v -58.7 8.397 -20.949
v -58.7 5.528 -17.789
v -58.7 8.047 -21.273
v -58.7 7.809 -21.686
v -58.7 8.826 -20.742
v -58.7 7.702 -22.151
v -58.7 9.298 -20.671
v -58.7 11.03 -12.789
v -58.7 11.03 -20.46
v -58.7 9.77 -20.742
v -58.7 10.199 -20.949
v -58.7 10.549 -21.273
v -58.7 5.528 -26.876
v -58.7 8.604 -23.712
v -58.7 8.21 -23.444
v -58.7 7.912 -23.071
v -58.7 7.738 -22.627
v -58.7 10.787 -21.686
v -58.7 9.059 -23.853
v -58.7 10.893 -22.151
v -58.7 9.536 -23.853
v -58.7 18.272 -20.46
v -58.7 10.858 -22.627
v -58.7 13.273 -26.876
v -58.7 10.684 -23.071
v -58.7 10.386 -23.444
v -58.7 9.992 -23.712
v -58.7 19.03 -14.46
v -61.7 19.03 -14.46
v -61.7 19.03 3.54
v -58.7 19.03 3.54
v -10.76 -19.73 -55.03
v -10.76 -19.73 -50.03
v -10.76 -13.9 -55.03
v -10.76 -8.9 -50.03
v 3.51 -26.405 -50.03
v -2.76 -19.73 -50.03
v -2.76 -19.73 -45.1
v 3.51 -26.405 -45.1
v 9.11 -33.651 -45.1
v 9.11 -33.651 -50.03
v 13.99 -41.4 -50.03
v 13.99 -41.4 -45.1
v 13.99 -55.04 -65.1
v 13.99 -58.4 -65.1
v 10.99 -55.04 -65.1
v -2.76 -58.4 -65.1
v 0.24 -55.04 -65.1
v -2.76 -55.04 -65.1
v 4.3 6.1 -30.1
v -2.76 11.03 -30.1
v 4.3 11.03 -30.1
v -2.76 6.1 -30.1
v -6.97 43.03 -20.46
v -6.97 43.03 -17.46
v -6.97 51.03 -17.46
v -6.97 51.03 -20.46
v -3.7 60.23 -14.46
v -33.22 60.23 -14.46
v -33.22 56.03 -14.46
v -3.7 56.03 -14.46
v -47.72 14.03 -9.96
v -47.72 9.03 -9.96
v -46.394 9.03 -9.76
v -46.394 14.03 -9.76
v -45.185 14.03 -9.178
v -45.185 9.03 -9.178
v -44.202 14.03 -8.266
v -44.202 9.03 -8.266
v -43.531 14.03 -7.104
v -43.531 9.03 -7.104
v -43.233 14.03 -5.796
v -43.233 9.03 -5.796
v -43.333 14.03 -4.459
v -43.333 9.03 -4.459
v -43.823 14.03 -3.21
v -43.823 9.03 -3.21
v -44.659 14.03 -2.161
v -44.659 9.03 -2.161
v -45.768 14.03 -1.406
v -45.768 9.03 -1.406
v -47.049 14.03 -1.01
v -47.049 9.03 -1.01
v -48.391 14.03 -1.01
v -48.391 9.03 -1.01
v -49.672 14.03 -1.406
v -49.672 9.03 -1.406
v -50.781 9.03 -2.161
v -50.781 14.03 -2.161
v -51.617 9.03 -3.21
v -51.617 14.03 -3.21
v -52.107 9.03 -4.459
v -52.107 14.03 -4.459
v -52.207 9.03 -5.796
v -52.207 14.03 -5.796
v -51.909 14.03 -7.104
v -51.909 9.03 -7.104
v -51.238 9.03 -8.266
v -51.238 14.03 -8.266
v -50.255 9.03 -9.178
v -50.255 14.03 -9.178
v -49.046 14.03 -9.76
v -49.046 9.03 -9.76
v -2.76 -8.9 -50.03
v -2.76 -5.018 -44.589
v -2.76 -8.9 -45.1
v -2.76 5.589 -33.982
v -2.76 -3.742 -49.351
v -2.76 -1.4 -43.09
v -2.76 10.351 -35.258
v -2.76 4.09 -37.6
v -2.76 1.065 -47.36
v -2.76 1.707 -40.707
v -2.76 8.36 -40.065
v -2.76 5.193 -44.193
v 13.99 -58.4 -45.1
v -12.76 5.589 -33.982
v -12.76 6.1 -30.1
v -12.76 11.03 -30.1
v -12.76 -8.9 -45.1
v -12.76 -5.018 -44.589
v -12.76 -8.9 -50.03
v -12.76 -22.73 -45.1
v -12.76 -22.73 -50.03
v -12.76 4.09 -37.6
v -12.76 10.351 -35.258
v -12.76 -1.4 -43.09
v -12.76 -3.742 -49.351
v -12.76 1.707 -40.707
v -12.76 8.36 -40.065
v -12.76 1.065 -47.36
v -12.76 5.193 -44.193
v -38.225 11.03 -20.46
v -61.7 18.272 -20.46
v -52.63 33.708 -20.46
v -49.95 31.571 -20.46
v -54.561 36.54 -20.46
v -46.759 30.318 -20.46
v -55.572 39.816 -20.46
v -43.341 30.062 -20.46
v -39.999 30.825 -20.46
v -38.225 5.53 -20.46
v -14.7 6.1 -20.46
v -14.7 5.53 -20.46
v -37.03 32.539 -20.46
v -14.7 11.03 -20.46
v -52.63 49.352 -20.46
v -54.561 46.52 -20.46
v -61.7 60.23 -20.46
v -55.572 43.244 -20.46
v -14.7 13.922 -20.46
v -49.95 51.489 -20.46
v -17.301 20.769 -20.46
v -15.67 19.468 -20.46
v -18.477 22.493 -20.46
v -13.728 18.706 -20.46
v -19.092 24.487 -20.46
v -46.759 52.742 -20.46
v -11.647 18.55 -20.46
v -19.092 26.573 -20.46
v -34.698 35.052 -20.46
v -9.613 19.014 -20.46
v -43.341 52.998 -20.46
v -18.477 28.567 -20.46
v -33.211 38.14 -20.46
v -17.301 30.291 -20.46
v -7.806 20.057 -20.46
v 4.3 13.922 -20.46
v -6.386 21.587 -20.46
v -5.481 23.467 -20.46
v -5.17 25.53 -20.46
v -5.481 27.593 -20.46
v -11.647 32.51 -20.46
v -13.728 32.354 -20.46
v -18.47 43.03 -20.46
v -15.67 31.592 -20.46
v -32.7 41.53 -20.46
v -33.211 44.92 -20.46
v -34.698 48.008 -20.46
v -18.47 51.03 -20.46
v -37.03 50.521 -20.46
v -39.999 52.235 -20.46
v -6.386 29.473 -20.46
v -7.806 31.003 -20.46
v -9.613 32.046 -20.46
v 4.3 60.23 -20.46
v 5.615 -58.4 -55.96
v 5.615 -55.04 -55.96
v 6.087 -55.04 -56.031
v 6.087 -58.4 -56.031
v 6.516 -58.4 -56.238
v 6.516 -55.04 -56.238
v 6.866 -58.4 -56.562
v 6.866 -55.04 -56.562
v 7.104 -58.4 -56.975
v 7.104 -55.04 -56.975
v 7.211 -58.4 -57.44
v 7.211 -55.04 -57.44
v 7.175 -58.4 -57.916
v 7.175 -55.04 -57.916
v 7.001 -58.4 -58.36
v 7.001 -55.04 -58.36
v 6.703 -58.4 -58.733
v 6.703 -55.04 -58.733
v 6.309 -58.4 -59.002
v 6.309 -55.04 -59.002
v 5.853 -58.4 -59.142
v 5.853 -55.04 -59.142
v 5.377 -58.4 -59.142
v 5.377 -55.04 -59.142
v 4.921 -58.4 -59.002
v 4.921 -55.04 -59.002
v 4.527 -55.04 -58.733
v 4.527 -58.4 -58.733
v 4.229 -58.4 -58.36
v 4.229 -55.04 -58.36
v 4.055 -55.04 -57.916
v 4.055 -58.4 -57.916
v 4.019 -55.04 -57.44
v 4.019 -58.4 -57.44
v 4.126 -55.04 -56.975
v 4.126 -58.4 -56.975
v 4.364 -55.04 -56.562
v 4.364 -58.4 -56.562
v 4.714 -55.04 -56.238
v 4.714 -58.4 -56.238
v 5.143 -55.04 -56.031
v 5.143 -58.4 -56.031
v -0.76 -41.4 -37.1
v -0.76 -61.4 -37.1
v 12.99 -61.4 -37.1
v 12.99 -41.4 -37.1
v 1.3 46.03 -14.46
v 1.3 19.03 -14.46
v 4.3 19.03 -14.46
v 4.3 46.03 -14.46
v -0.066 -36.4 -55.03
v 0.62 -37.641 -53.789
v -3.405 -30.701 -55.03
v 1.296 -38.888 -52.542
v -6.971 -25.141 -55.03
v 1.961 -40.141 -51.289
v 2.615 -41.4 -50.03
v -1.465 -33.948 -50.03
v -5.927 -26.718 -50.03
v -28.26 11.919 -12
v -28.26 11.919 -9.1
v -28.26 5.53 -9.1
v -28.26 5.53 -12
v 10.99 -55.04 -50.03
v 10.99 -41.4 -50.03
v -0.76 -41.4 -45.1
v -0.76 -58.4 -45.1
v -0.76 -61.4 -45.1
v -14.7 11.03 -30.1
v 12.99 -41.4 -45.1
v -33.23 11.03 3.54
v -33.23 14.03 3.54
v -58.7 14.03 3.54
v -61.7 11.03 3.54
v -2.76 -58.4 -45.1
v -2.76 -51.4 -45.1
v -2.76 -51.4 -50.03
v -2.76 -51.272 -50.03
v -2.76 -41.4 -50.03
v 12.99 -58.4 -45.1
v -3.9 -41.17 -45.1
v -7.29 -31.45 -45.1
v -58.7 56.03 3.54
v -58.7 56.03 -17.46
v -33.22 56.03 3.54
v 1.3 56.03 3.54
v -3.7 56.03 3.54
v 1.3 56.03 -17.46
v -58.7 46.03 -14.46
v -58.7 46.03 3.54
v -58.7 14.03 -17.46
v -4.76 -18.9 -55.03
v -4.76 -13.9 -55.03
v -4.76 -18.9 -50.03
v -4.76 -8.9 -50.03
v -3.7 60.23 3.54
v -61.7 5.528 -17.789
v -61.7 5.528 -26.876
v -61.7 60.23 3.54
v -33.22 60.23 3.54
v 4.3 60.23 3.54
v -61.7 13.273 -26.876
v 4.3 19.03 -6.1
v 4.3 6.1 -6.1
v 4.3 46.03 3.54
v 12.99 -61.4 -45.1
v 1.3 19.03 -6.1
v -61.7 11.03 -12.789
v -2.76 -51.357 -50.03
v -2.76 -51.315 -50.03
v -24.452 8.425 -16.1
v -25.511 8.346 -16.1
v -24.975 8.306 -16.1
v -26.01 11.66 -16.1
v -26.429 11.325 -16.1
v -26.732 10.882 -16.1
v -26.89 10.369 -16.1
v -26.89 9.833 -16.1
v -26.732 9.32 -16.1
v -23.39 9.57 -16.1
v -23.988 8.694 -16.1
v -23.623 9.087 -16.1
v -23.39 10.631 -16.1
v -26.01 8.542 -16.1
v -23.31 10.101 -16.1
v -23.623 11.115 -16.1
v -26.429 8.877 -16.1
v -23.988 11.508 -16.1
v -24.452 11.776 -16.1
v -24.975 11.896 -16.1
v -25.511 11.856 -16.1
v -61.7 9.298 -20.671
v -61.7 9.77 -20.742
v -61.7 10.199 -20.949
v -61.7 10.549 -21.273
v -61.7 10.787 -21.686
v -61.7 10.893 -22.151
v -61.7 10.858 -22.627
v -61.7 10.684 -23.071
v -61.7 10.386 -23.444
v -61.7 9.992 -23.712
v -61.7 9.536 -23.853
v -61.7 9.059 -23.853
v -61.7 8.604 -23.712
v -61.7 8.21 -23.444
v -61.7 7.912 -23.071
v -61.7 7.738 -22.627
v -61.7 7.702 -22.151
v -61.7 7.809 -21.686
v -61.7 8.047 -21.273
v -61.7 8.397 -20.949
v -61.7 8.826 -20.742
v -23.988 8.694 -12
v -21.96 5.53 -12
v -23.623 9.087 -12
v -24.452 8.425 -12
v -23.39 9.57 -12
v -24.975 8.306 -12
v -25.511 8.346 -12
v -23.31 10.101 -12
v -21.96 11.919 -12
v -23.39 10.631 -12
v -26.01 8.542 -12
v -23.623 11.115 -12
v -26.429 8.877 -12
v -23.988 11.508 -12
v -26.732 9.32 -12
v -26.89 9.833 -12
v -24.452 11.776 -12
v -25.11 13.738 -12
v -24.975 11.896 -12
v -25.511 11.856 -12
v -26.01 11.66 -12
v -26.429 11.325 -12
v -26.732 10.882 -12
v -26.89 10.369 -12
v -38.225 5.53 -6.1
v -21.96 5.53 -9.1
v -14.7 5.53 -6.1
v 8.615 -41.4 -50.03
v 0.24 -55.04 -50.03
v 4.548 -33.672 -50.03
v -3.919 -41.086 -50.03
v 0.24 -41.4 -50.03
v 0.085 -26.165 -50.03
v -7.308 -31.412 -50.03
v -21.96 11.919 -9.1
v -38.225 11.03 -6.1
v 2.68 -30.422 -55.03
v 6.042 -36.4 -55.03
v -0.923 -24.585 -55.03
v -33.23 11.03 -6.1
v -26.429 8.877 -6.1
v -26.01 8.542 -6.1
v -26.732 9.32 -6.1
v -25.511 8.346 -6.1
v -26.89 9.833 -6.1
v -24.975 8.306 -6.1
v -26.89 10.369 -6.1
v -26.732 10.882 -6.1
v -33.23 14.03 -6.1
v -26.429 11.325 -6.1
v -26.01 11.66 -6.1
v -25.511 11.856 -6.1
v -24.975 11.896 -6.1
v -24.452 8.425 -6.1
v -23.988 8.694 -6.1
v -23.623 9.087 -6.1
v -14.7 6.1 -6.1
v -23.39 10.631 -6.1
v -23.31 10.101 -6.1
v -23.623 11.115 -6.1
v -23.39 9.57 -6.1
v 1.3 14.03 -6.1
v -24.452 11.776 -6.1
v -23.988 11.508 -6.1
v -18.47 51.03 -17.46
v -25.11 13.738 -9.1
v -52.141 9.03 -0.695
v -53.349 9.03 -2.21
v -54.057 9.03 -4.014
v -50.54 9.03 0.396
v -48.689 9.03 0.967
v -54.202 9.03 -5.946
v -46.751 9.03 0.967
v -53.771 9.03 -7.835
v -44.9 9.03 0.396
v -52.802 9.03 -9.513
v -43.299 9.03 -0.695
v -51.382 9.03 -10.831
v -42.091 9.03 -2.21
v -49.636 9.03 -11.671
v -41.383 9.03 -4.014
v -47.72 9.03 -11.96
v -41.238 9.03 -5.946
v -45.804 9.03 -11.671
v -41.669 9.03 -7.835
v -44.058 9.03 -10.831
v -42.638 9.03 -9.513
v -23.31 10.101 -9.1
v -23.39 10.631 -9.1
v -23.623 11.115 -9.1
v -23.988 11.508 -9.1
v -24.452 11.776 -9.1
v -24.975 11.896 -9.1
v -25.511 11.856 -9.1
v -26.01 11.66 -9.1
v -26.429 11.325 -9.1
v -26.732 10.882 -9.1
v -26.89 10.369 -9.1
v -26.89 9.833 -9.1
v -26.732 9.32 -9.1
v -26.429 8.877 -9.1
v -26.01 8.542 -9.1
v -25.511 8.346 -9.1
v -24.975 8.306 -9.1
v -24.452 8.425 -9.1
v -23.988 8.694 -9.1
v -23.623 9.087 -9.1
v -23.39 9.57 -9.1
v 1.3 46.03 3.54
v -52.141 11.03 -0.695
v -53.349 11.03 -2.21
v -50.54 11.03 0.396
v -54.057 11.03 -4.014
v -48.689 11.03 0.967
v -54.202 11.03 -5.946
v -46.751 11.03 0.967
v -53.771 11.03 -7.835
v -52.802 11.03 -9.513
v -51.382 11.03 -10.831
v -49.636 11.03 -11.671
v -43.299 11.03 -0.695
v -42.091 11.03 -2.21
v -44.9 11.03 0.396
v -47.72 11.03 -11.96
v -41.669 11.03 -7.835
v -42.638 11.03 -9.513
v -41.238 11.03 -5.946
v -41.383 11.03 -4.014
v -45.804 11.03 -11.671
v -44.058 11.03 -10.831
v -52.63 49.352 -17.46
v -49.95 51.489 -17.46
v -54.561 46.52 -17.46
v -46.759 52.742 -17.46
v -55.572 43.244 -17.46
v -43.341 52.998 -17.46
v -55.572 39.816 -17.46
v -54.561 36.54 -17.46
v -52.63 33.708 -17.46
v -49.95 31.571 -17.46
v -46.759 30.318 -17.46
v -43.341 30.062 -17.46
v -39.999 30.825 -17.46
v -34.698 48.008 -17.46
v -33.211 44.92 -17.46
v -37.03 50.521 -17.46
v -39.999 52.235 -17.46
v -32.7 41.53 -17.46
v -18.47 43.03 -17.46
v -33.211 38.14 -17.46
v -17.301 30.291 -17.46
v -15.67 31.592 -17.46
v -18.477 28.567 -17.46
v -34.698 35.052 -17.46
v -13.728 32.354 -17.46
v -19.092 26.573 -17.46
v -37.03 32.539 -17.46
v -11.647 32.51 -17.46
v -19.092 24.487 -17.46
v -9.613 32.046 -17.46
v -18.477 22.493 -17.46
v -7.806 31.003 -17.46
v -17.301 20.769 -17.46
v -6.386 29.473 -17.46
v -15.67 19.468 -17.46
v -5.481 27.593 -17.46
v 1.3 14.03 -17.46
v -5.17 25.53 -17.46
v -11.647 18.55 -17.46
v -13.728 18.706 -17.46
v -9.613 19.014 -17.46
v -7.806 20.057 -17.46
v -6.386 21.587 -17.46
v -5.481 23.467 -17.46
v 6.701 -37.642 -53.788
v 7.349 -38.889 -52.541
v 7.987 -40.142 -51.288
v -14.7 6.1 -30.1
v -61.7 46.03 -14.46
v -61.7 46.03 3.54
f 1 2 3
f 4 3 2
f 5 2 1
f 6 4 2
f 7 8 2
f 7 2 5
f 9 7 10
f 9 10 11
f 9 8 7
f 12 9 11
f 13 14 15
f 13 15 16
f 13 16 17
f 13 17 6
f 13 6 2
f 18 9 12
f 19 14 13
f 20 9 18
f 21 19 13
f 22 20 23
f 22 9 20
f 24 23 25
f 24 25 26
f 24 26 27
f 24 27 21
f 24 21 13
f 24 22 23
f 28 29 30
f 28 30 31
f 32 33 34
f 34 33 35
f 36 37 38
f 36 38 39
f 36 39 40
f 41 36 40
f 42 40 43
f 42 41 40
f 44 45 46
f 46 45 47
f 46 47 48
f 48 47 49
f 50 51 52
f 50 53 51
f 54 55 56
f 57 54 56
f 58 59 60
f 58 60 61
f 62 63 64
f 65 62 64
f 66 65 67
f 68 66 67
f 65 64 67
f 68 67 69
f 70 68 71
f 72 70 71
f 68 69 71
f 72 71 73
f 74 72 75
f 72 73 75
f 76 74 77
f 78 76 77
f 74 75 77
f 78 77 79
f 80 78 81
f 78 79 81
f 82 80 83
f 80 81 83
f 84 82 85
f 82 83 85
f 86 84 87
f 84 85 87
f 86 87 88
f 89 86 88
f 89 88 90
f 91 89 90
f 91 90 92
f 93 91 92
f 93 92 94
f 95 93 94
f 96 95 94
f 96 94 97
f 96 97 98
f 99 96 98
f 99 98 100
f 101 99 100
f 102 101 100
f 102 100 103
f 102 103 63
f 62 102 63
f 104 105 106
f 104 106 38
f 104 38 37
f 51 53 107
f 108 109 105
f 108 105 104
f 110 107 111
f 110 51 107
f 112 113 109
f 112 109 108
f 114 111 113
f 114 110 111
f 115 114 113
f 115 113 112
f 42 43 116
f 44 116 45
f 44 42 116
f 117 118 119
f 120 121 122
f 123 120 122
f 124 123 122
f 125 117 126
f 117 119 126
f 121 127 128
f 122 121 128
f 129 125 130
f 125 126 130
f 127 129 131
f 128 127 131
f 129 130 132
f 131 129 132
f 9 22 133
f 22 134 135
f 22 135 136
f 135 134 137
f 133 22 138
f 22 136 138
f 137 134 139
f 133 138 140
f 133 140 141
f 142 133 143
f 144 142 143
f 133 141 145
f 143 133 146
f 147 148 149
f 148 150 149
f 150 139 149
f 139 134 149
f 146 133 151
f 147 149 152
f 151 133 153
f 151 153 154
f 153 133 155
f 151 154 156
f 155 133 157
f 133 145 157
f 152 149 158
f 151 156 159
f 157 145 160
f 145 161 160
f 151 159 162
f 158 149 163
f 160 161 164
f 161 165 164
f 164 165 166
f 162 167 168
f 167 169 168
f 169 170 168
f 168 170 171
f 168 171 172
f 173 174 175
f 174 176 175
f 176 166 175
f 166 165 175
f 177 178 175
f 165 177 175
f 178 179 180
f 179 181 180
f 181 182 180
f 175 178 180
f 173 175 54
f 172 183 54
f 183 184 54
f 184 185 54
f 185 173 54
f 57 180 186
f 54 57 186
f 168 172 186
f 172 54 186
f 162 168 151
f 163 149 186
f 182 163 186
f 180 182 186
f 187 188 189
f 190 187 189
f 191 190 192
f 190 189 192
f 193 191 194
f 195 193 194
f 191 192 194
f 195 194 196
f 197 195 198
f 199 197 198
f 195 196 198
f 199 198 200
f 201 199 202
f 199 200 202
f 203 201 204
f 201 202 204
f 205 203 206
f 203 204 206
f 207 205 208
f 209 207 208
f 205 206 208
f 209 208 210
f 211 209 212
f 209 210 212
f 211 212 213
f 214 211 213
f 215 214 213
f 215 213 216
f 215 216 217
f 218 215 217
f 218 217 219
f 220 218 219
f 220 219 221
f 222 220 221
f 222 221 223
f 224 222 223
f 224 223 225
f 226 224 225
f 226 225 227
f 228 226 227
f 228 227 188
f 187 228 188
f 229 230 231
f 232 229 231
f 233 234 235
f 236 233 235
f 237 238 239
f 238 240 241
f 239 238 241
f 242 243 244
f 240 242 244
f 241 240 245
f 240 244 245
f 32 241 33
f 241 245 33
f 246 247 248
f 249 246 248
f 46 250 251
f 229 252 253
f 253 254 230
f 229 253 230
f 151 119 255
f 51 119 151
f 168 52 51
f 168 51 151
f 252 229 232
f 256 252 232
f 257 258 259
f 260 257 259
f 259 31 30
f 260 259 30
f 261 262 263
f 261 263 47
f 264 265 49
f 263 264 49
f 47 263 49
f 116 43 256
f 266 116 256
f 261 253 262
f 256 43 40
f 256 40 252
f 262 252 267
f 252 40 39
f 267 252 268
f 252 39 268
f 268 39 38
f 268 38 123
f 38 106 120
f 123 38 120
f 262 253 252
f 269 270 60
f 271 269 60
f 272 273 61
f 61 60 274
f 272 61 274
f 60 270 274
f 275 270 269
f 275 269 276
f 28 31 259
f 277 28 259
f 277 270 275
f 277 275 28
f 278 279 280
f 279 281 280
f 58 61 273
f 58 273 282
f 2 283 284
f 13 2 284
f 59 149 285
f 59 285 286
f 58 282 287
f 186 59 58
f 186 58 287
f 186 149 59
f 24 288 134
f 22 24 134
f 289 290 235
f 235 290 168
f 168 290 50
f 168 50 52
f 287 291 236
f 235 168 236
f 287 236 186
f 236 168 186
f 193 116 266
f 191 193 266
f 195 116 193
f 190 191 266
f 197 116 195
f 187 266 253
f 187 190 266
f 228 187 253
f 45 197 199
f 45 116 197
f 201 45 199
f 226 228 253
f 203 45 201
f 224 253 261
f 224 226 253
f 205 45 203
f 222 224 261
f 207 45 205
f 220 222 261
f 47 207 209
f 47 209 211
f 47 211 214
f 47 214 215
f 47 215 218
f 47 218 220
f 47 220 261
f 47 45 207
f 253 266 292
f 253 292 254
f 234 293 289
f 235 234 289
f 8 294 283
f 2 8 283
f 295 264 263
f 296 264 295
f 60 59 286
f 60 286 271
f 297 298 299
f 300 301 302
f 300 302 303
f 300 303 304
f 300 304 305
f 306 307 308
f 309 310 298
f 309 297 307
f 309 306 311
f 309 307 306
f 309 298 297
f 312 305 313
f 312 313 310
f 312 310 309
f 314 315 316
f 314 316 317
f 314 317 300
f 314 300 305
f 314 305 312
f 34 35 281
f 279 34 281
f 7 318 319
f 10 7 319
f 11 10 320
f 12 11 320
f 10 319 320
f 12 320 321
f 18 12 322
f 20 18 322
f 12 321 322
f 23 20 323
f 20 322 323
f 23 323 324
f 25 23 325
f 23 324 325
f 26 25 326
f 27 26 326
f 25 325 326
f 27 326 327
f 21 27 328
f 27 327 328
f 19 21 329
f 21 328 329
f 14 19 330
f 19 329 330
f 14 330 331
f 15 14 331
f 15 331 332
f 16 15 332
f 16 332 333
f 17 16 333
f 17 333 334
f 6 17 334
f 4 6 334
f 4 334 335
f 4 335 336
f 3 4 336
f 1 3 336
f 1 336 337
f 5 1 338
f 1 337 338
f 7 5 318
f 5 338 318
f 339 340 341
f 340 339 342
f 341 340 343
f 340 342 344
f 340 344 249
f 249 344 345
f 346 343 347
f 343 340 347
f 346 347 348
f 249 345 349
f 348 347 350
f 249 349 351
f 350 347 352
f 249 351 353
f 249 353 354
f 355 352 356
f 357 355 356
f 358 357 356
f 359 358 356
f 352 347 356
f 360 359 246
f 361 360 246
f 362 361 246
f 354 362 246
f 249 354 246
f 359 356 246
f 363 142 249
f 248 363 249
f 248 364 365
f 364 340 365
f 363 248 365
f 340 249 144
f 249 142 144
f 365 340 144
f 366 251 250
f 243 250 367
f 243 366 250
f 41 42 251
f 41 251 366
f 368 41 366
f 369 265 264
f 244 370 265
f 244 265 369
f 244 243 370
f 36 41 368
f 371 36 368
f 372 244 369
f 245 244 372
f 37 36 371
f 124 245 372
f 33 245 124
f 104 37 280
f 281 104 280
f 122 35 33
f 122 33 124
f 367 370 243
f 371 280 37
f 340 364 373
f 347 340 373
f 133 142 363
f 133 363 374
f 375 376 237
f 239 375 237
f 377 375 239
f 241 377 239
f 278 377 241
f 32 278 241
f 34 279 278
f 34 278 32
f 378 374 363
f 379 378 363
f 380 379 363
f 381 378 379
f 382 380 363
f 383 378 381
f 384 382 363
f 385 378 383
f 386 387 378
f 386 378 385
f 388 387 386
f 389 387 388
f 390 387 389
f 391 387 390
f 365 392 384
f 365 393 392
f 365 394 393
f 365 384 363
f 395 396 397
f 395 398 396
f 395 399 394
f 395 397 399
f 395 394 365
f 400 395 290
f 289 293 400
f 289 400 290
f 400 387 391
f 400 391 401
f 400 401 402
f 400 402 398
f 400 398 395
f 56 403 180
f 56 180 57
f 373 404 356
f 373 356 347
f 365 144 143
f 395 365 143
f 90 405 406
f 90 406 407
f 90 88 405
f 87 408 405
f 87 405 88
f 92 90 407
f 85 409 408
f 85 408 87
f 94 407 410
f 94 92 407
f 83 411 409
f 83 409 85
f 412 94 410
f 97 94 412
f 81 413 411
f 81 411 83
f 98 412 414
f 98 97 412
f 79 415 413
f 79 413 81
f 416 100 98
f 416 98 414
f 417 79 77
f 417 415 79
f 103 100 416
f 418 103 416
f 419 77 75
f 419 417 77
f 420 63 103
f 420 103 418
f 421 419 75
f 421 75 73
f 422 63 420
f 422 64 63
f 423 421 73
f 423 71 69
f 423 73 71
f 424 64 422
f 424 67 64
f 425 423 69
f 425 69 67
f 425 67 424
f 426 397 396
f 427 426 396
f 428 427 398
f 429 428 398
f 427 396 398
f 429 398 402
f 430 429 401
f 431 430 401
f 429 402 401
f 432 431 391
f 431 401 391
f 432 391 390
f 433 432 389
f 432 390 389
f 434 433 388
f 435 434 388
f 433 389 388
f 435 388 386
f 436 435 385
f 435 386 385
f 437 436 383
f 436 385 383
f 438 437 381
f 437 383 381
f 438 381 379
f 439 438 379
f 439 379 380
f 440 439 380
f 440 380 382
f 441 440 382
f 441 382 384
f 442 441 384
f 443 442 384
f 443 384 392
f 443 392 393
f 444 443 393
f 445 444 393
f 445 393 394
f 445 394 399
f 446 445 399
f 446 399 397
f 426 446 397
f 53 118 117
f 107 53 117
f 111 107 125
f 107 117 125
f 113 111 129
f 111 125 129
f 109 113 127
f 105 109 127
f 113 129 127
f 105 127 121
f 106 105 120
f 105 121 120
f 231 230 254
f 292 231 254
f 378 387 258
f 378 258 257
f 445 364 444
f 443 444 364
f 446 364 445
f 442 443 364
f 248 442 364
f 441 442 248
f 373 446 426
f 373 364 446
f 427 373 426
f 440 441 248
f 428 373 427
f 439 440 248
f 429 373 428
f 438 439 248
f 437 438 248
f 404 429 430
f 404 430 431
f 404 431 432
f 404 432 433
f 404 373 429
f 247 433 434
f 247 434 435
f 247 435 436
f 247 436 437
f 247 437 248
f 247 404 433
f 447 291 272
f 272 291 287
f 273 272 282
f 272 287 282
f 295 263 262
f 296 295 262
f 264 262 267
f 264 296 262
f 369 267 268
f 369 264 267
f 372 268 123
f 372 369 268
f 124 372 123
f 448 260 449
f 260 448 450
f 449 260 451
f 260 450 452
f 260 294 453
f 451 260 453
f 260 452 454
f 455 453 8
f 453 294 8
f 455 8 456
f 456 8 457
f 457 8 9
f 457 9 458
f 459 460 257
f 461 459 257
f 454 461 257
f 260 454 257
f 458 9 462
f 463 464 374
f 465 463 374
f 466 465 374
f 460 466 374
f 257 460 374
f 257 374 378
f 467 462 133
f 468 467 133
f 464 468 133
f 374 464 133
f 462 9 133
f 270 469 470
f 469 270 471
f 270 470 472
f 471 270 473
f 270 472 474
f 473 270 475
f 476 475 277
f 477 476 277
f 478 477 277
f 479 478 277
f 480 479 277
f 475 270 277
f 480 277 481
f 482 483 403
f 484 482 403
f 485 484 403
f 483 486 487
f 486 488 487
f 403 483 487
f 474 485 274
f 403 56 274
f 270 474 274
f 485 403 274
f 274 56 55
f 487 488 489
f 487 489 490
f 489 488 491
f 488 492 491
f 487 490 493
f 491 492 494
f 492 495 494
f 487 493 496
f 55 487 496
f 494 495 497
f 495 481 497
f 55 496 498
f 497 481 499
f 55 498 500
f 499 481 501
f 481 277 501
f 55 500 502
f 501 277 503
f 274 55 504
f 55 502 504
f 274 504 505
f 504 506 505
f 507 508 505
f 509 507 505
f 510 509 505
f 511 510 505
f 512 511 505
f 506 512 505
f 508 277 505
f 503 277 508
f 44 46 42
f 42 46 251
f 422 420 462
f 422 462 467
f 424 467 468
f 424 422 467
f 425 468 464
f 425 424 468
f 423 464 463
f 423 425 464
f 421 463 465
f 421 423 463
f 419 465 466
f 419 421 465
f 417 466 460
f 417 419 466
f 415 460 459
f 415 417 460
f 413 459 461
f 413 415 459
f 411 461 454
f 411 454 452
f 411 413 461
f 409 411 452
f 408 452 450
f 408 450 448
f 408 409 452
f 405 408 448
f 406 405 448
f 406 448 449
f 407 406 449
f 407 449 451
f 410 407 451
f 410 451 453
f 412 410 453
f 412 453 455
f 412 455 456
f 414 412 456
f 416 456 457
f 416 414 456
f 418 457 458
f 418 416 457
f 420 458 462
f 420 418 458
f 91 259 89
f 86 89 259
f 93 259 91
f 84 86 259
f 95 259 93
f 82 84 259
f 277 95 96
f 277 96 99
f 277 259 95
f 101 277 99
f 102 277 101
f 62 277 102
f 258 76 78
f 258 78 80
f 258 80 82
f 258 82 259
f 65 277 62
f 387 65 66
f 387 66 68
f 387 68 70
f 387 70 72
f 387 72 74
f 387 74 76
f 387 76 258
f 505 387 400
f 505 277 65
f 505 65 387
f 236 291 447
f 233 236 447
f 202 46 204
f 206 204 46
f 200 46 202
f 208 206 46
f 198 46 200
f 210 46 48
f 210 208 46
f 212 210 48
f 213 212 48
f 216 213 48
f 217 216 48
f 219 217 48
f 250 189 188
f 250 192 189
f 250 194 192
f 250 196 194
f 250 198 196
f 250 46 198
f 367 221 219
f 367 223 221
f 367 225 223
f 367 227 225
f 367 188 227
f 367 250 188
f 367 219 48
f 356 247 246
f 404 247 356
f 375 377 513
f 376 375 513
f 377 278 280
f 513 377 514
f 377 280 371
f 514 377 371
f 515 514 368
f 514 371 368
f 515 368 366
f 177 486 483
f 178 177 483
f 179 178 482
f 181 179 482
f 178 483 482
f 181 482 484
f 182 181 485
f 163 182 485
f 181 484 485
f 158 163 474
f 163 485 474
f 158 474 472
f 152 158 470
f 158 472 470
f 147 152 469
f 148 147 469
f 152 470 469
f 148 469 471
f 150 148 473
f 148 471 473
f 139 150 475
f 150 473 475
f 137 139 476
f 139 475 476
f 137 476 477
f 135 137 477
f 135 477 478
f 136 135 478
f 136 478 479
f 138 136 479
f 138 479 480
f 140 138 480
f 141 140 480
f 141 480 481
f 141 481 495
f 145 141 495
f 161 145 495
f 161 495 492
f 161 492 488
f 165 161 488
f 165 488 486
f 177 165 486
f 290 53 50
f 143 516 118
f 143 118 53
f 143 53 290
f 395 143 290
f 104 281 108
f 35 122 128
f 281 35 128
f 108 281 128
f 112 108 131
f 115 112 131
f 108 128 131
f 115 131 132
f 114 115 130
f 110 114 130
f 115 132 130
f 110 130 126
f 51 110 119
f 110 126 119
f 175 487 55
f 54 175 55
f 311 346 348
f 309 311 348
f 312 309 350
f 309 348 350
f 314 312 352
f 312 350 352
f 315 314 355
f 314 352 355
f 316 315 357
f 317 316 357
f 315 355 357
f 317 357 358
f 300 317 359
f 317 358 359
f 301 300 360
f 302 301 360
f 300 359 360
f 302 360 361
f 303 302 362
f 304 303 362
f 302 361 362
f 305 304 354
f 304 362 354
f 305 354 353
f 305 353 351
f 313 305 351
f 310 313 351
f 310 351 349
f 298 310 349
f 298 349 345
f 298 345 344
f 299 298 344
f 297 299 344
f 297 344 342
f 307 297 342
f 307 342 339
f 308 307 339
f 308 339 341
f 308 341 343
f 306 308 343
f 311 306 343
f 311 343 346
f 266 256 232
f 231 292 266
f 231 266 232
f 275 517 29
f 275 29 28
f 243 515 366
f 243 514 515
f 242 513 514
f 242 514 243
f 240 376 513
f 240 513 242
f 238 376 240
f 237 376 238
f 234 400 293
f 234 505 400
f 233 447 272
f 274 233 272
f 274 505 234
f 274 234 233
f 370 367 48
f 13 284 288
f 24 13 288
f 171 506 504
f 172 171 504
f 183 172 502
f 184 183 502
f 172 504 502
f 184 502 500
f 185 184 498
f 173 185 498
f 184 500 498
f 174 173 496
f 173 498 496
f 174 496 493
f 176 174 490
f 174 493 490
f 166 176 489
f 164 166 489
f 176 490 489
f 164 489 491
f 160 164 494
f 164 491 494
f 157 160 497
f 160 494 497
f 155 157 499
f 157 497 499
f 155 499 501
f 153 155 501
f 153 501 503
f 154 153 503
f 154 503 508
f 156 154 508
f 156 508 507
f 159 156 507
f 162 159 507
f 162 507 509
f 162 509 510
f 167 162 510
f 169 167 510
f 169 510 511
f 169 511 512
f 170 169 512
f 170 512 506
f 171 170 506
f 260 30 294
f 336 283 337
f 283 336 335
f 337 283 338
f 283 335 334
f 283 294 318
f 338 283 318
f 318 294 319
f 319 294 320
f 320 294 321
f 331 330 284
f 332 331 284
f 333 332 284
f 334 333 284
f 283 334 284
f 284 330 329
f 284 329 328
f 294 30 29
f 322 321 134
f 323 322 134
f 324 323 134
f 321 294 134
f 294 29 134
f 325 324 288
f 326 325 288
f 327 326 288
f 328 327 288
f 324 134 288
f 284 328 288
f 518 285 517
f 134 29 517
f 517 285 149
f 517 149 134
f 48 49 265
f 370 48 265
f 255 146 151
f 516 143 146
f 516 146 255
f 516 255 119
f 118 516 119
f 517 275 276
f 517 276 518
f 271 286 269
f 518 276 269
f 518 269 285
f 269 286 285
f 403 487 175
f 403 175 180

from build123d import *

# Parameters (mm, degrees)
RESSALTO_EXTRUS_O1_DEPTH              = 4.93
RESSALTO_EXTRUS_O2_DEPTH              = 14.7
RESSALTO_EXTRUS_O3_DEPTH              = 10
ESBO_O5_W                             = 16.75
ESBO_O5_H                             = 41.67
RESSALTO_EXTRUS_O4_DEPTH              = 4.93
CORTE_EXTRUS_O1_REACH                 = 85.706
RESSALTO_EXTRUS_O5_DEPTH              = 16.75
RESSALTO_EXTRUS_O6_DEPTH              = 19
CORTE_EXTRUS_O2_REACH                 = 96.288
ESBO_O9_W                             = 10.75
ESBO_O9_H                             = 13.64
CORTE_EXTRUS_O3_REACH                 = 96.288
ESBO_O10_W                            = 13
ESBO_O10_H                            = 15.64
ESBO_O11_W                            = 13.75
ESBO_O11_H                            = 8
RESSALTO_EXTRUS_O7_DEPTH              = 20
ESBO_O12_W                            = 6
ESBO_O12_H                            = 39.4
RESSALTO_EXTRUS_O8_DEPTH              = 5
RESSALTO_EXTRUS_O9_DEPTH              = 5
CHANFRO1_SIZE                         = 5
CHANFRO2_SIZE                         = 5
CORTE_EXTRUS_O4_REACH                 = 95.911
ESBO_O14_R                            = 1.6
ESBO_O15_W                            = 19
ESBO_O15_H                            = 24
RESSALTO_EXTRUS_O10_DEPTH             = 3
RESSALTO_EXTRUS_O10_DIRECTION_2_REACH = 100.49
RESSALTO_EXTRUS_O11_DEPTH             = 46.2
RESSALTO_EXTRUS_O11_DEPTH_BACK        = 3
ESBO_O16_W                            = 66
ESBO_O16_H                            = 3
RESSALTO_EXTRUS_O12_DEPTH             = 21
ESBO_O18_W                            = 29.52
ESBO_O18_H                            = 4.2
ESBO_O18_W_2                          = 3
ESBO_O18_H_2                          = 32
ESBO_O18_W_3                          = 18.53
ESBO_O18_H_3                          = 3
ESBO_O18_H_4                          = 27
RESSALTO_EXTRUS_O13_DEPTH             = 3
CORTE_EXTRUS_O5_REACH                 = 101.229
ESBO_O19_R                            = 11.5
ESBO_O19_R_2                          = 7
ESBO_O19_W                            = 11.5
ESBO_O19_H                            = 8
CHANFRO3_SIZE                         = 3
CHANFRO3_SIZE_2                       = 10
CORTE_EXTRUS_O6_REACH                 = 117.287
ESBO_O20_R                            = 4.5
RESSALTO_EXTRUS_O14_START             = 2
ESBO_O21_R                            = 6.5
ESBO_O21_R_2                          = 4.5
RESSALTO_EXTRUS_O14_DEPTH             = 2
ESBO_O24_W                            = 3
ESBO_O24_H                            = 5
RESSALTO_EXTRUS_O15_DEPTH             = 8.36
ESBO_O25_W                            = 8
ESBO_O25_H                            = 6
RESSALTO_EXTRUS_O16_DEPTH             = 5.5
ESBO_O26_R                            = 1.6
RESSALTO_EXTRUS_O17_DEPTH             = 3
ESBO_O28_W                            = 16.75
ESBO_O28_H                            = 3
CORTE_EXTRUS_O7_DEPTH                 = 20
ESBO_O29_W                            = 19
ESBO_O29_H                            = 2.999181093
CORTE_EXTRUS_O8_DEPTH                 = 20
ESBO_O30_W                            = 19
ESBO_O30_H                            = 72.430818907
CORTE_EXTRUS_O9_DEPTH                 = 106.156312221
RESSALTO_EXTRUS_O18_REACH             = 102.704
ESBO_O31_W                            = 23.524536133
ESBO_O31_H                            = 8.5
RESSALTO_EXTRUS_O18_DIRECTION_2_REACH = 102.704
ESBO_O32_R                            = 1.8
CORTE_EXTRUS_O10_DEPTH                = 10
CORTE_EXTRUS_O11_START                = -3
CORTE_EXTRUS_O11_DEPTH                = 2.9


# Some blends are built 0.0001 mm under size
with BuildPart() as part:
    # Esboço1 → Ressalto-extrusão1 (new body)
    with BuildSketch(Plane.XY):
        Polygon((0, 0), (-14.7, 0), (-14.7, -61.4), (4.3, -61.4), (4.3, -39.4), align=None)
    extrude(amount=RESSALTO_EXTRUS_O1_DEPTH)

    # Esboço2 → Ressalto-extrusão2 (add)
    with BuildSketch(Plane.ZY.offset(14.7)):
        with BuildLine():
            Line((0, 0), (4.93, 0))
            ThreePointArc((4.93, 0), (1.699387796, 7.799387796), (-6.1, 11.03))
            Line((-6.1, 11.03), (-30.1, 11.03))
            Line((-30.1, 11.03), (-30.1, 6.1))
            Line((-30.1, 6.1), (-6.1, 6.1))
            ThreePointArc((-6.1, 6.1), (-1.786648635, 4.313351365), (0, 0))
        make_face()
    extrude(amount=-RESSALTO_EXTRUS_O2_DEPTH)

    # Esboço4 → Ressalto-extrusão3 (add)
    with BuildSketch(Plane.ZY.offset(12.76)):
        with BuildLine():
            Line((-30.1, 11.03), (-30.1, 6.1))
            ThreePointArc((-30.1, 6.1), (-40.706601718, 1.706601718), (-45.1, -8.9))
            Line((-45.1, -8.9), (-45.1, -61.4))
            Line((-45.1, -61.4), (-50.03, -61.4))
            Line((-50.03, -61.4), (-50.03, -8.9))
            ThreePointArc((-50.03, -8.9), (-44.192638149, 5.192638149), (-30.1, 11.03))
        make_face()
    extrude(amount=-RESSALTO_EXTRUS_O3_DEPTH)

    # Esboço5 → Ressalto-extrusão4 (add)
    with BuildSketch(Plane(origin=(0, 0, -50.03), x_dir=(-1, 0, 0), z_dir=(0, 0, -1))):
        with Locations((-5.615, -40.565)):
            Rectangle(ESBO_O5_W, ESBO_O5_H)
    extrude(amount=-RESSALTO_EXTRUS_O4_DEPTH)

    # Esboço6 → Corte-extrusão1 (cut, up to next)
    with BuildSketch(Plane(origin=(0, 0, -50.03), x_dir=(-1, 0, 0), z_dir=(0, 0, -1)), mode=Mode.PRIVATE) as corte_extrus_o1_sk1:
        with BuildLine():
            Line((12.76, -61.4), (2.76, -61.4))
            Line((2.76, -61.4), (2.76, -51.4))
            ThreePointArc((2.76, -51.4), (5.321457267, -36.21444446), (12.76, -22.73))
            Line((12.76, -22.73), (12.76, -61.4))
        make_face()
    corte_extrus_o1_tool1 = extrude(corte_extrus_o1_sk1.sketch, amount=-CORTE_EXTRUS_O1_REACH, mode=Mode.PRIVATE) & part.part
    # Esboço6 → Corte-extrusão1 (cut, up to next)
    with BuildSketch(Plane(origin=(0, 0, -50.03), x_dir=(-1, 0, 0), z_dir=(0, 0, -1)), mode=Mode.PRIVATE) as corte_extrus_o1_sk2:
        with BuildLine():
            Line((-13.99, -41.4), (-13.99, -19.73))
            Line((-13.99, -19.73), (2.76, -19.73))
            ThreePointArc((2.76, -19.73), (-6.396882999, -29.960637276), (-13.99, -41.4))
        make_face()
    corte_extrus_o1_tool2 = extrude(corte_extrus_o1_sk2.sketch, amount=-CORTE_EXTRUS_O1_REACH, mode=Mode.PRIVATE) & part.part
    add(corte_extrus_o1_tool1.solids().sort_by_distance((-8.393606, -45.852679, -50.03))[0], mode=Mode.SUBTRACT)
    add(corte_extrus_o1_tool2.solids().sort_by_distance((8.680645, -26.580869, -50.03))[0], mode=Mode.SUBTRACT)

    # Esboço7 → Ressalto-extrusão5 (add)
    with BuildSketch(Plane.ZY.offset(2.76)):
        Polygon((-50.03, -61.4), (-65.1, -61.4), (-65.1, -55.04), (-50.03, -41.4), align=None)
    extrude(amount=-RESSALTO_EXTRUS_O5_DEPTH)

    # Esboço8 → Ressalto-extrusão6 (add)
    with BuildSketch(Plane.ZY.offset(14.7)):
        Polygon((4.93, -61.4), (20, -61.4), (20, -55.04), (4.93, -39.4), align=None)
    extrude(amount=-RESSALTO_EXTRUS_O6_DEPTH)

    # Esboço9 → Corte-extrusão2 (cut, up to next)
    with BuildSketch(Plane(origin=(0, 0, -50.03), x_dir=(-1, 0, 0), z_dir=(0, 0, -1)), mode=Mode.PRIVATE) as corte_extrus_o2_sk1:
        with Locations((-5.615, -48.22)):
            Rectangle(ESBO_O9_W, ESBO_O9_H)
    corte_extrus_o2_tool1 = extrude(corte_extrus_o2_sk1.sketch, amount=CORTE_EXTRUS_O2_REACH, mode=Mode.PRIVATE) & part.part
    add(corte_extrus_o2_tool1.solids().sort_by_distance((5.615, -48.22, -50.03))[0], mode=Mode.SUBTRACT)

    # Esboço10 → Corte-extrusão3 (cut, up to next)
    with BuildSketch(Plane.XY.offset(4.93), mode=Mode.PRIVATE) as corte_extrus_o3_sk1:
        with Locations((-5.2, -47.22)):
            Rectangle(ESBO_O10_W, ESBO_O10_H)
    corte_extrus_o3_tool1 = extrude(corte_extrus_o3_sk1.sketch, amount=CORTE_EXTRUS_O3_REACH, mode=Mode.PRIVATE) & part.part
    add(corte_extrus_o3_tool1.solids().sort_by_distance((-5.2, -47.22, 4.93))[0], mode=Mode.SUBTRACT)

    # Esboço11 → Ressalto-extrusão7 (add)
    with BuildSketch(Plane.XZ.offset(61.4)):
        with Locations((6.115, -41.1)):
            Rectangle(ESBO_O11_W, ESBO_O11_H)
    extrude(amount=-RESSALTO_EXTRUS_O7_DEPTH)

    # Esboço12 → Ressalto-extrusão8 (add)
    with BuildSketch(Plane.XY.offset(4.93)):
        with Locations((-7.35, -19.7)):
            Rectangle(ESBO_O12_W, ESBO_O12_H)
    extrude(amount=RESSALTO_EXTRUS_O8_DEPTH)

    # Esboço13 → Ressalto-extrusão9 (add)
    with BuildSketch(Plane(origin=(0, 0, -50.03), x_dir=(-1, 0, 0), z_dir=(0, 0, -1))):
        with BuildLine():
            Line((10.76, -8.9), (4.76, -8.9))
            Line((4.76, -8.9), (4.76, -18.9))
            ThreePointArc((4.76, -18.9), (-2.365001835, -29.889929465), (-8.615, -41.4))
            Line((-8.615, -41.4), (-2.615, -41.4))
            ThreePointArc((-2.615, -41.4), (3.649096622, -30.303670043), (10.76, -19.73))
            Line((10.76, -19.73), (10.76, -8.9))
        make_face()
    extrude(amount=RESSALTO_EXTRUS_O9_DEPTH)

    # Chanfro1
    chanfro1_edges = [part.edges().sort_by_distance(p)[0] for p in [
        (-7.76, -8.9, -55.03),
        (5.615, -41.4, -55.03),
    ]]
    chamfer(chanfro1_edges, length=CHANFRO1_SIZE - 0.0001)  # a hair under: the kernel refuses the full size

    # Chanfro2
    chanfro2_edges = [part.edges().sort_by_distance(p)[0] for p in [
        (-7.35, -39.4, 9.93),
        (-7.35, 0, 9.93),
    ]]
    chamfer(chanfro2_edges, length=CHANFRO2_SIZE - 0.0001)  # a hair under: the kernel refuses the full size

    # Esboço14 → Corte-extrusão4 (cut, up to next)
    with BuildSketch(Plane(origin=(0, -55.04, 0), x_dir=(1, 0, 0), z_dir=(0, 1, 0)), mode=Mode.PRIVATE) as corte_extrus_o4_sk1:
        with Locations(Location((-5.2, -12.465, 0), (0, 0, 270))):
            Circle(ESBO_O14_R)
    corte_extrus_o4_tool1 = extrude(corte_extrus_o4_sk1.sketch, amount=-CORTE_EXTRUS_O4_REACH, mode=Mode.PRIVATE) & part.part
    # Esboço14 → Corte-extrusão4 (cut, up to next)
    with BuildSketch(Plane(origin=(0, -55.04, 0), x_dir=(1, 0, 0), z_dir=(0, 1, 0)), mode=Mode.PRIVATE) as corte_extrus_o4_sk2:
        with Locations(Location((5.615, 57.56, 0), (0, 0, 270))):
            Circle(ESBO_O14_R)
    corte_extrus_o4_tool2 = extrude(corte_extrus_o4_sk2.sketch, amount=-CORTE_EXTRUS_O4_REACH, mode=Mode.PRIVATE) & part.part
    add(corte_extrus_o4_tool1.solids().sort_by_distance((-5.2, -55.04, 12.465))[0], mode=Mode.SUBTRACT)
    add(corte_extrus_o4_tool2.solids().sort_by_distance((5.615, -55.04, -57.56))[0], mode=Mode.SUBTRACT)

    # Esboço15 → Ressalto-extrusão10 (add)
    with BuildSketch(Plane(origin=(0, 11.03, 0), x_dir=(1, 0, 0), z_dir=(0, 1, 0))):
        with Locations((-5.2, 18.1)):
            Rectangle(ESBO_O15_W, ESBO_O15_H)
    extrude(amount=RESSALTO_EXTRUS_O10_DEPTH)

    # Ressalto-extrusão10 direction 2: up to this face of the body (flat: up to its plane)
    ressalto_extrus_o10_direction_2_end = Plane(part.part.faces().sort_by_distance((-7.35, 6.1, -18.1))[0])
    # Esboço15 → Ressalto-extrusão10 direction 2 (add, up to the picked face)
    with BuildSketch(Plane(origin=(0, 11.03, 0), x_dir=(1, 0, 0), z_dir=(0, 1, 0)), mode=Mode.PRIVATE) as ressalto_extrus_o10_direction_2_sk1:
        with Locations((-5.2, 18.1)):
            Rectangle(ESBO_O15_W, ESBO_O15_H)
    ressalto_extrus_o10_direction_2_tool1 = split(extrude(ressalto_extrus_o10_direction_2_sk1.sketch, amount=-RESSALTO_EXTRUS_O10_DIRECTION_2_REACH, mode=Mode.PRIVATE), bisect_by=ressalto_extrus_o10_direction_2_end, keep=Keep.BOTH, mode=Mode.PRIVATE)
    add(ressalto_extrus_o10_direction_2_tool1.solids().sort_by(Axis((-5.2, 11.03, -18.1), (0, -1, 0)))[0])

    # Esboço16 → Ressalto-extrusão11 (add, two sides: drawn at the far end of the back side and taken through both)
    with BuildSketch(Plane(origin=(0, 14.03, 0), x_dir=(1, 0, 0), z_dir=(0, 1, 0)).offset(-RESSALTO_EXTRUS_O11_DEPTH_BACK)):
        with Locations((-28.7, 18.96)):
            Rectangle(ESBO_O16_W, ESBO_O16_H)
    extrude(amount=RESSALTO_EXTRUS_O11_DEPTH + RESSALTO_EXTRUS_O11_DEPTH_BACK)

    # Esboço17 → Ressalto-extrusão12 (add)
    with BuildSketch(Plane.XY.offset(-17.46)):
        Polygon((-61.7, 60.23), (-33.22, 60.23), (-33.22, 56.03), (-58.7, 56.03), (-58.7, 46.03), (-61.7, 46.03), align=None)
        Polygon((-61.7, 11.03), (-61.7, 19.03), (-58.7, 19.03), (-58.7, 14.03), (-33.23, 14.03), (-33.23, 11.03), align=None)
        Polygon((4.3, 60.23), (4.3, 46.03), (1.3, 46.03), (1.3, 56.03), (-3.7, 56.03), (-3.7, 60.23), align=None)
    extrude(amount=RESSALTO_EXTRUS_O12_DEPTH)

    # Esboço18 → Ressalto-extrusão13 (add)
    with BuildSketch(Plane.XY.offset(-17.46)):
        with Locations((-18.46, 58.13)):
            Rectangle(ESBO_O18_W, ESBO_O18_H)
        with Locations((2.8, 30.03)):
            Rectangle(ESBO_O18_W_2, ESBO_O18_H_2)
        with Locations((-23.965, 12.53)):
            Rectangle(ESBO_O18_W_3, ESBO_O18_H_3)
        with Locations((-60.2, 32.53)):
            Rectangle(ESBO_O18_W_2, ESBO_O18_H_4)
    extrude(amount=RESSALTO_EXTRUS_O13_DEPTH)

    # Esboço19 → Corte-extrusão5 (cut, up to next)
    with BuildSketch(Plane.XY.offset(-17.46), mode=Mode.PRIVATE) as corte_extrus_o5_sk1:
        with Locations((-44.2, 41.53)):
            Circle(ESBO_O19_R)
    corte_extrus_o5_tool1 = extrude(corte_extrus_o5_sk1.sketch, amount=-CORTE_EXTRUS_O5_REACH, mode=Mode.PRIVATE) & part.part
    # Esboço19 → Corte-extrusão5 (cut, up to next)
    with BuildSketch(Plane.XY.offset(-17.46), mode=Mode.PRIVATE) as corte_extrus_o5_sk2:
        with Locations((-12.17, 25.53)):
            Circle(ESBO_O19_R_2)
    corte_extrus_o5_tool2 = extrude(corte_extrus_o5_sk2.sketch, amount=-CORTE_EXTRUS_O5_REACH, mode=Mode.PRIVATE) & part.part
    # Esboço19 → Corte-extrusão5 (cut, up to next)
    with BuildSketch(Plane.XY.offset(-17.46), mode=Mode.PRIVATE) as corte_extrus_o5_sk3:
        with Locations((-12.72, 47.03)):
            Rectangle(ESBO_O19_W, ESBO_O19_H)
    corte_extrus_o5_tool3 = extrude(corte_extrus_o5_sk3.sketch, amount=-CORTE_EXTRUS_O5_REACH, mode=Mode.PRIVATE) & part.part
    add(corte_extrus_o5_tool1.solids().sort_by_distance((-44.2, 41.53, -17.46))[0], mode=Mode.SUBTRACT)
    add(corte_extrus_o5_tool2.solids().sort_by_distance((-12.17, 25.53, -17.46))[0], mode=Mode.SUBTRACT)
    add(corte_extrus_o5_tool3.solids().sort_by_distance((-12.72, 47.03, -17.46))[0], mode=Mode.SUBTRACT)

    # Chanfro3
    # the kernel refuses this chamfer: 10, 3 mm, written as the material it takes off along each edge
    with BuildSketch(Plane(origin=(30.259416678, 14.03, -30.1), x_dir=(0, -0.9925205348140391, -0.12207779475585895), z_dir=(-1, 0, 0))) as chanfro3_piece_1_section:
        Polygon((CHANFRO3_SIZE * 0.992520534814, CHANFRO3_SIZE * 0.122077794756), (-CHANFRO3_SIZE_2 * 0.122077794756, CHANFRO3_SIZE_2 * 0.992520534814), (0, 0), align=None)
    chanfro3_piece_1 = extrude(amount=70.918833356, mode=Mode.PRIVATE)
    chanfro3_piece_1 = split(chanfro3_piece_1, bisect_by=Plane(origin=(0.77, 13.028749035, -20.46), z_dir=(0, 0, -1)), keep=Keep.TOP, mode=Mode.PRIVATE)
    add(chanfro3_piece_1, mode=Mode.SUBTRACT)

    # Esboço20 → Corte-extrusão6 (cut, up to next)
    with BuildSketch(Plane.XZ.offset(-11.03), mode=Mode.PRIVATE) as corte_extrus_o6_sk1:
        with Locations(Location((-47.72, -5.46, 0), (0, 0, 270))):
            Circle(ESBO_O20_R)
    corte_extrus_o6_tool1 = extrude(corte_extrus_o6_sk1.sketch, amount=-CORTE_EXTRUS_O6_REACH, mode=Mode.PRIVATE) & part.part
    add(corte_extrus_o6_tool1.solids().sort_by_distance((-47.72, 11.03, -5.46))[0], mode=Mode.SUBTRACT)

    # Esboço21 → Ressalto-extrusão14 (add)
    with BuildSketch(Plane.XZ.offset(-11.03).offset(RESSALTO_EXTRUS_O14_START)):
        with Locations(Location((-47.72, -5.46, 0), (0, 0, 270))):
            Circle(ESBO_O21_R)
        with Locations(Location((-47.72, -5.46, 0), (0, 0, 270))):
            Circle(ESBO_O21_R_2, mode=Mode.SUBTRACT)
    extrude(amount=-RESSALTO_EXTRUS_O14_DEPTH)

    # Esboço24 → Ressalto-extrusão15 (add)
    with BuildSketch(Plane.XY.offset(-14.46)):
        with Locations((2.8, 16.53)):
            Rectangle(ESBO_O24_W, ESBO_O24_H)
    extrude(amount=RESSALTO_EXTRUS_O15_DEPTH)

    # Esboço25 → Ressalto-extrusão16 (add)
    with BuildSketch(Plane.XZ.offset(-11.03)):
        with Locations((-34.224536133, -17.46)):
            Rectangle(ESBO_O25_W, ESBO_O25_H)
    extrude(amount=RESSALTO_EXTRUS_O16_DEPTH)

    # Esboço26 → Ressalto-extrusão17 (add)
    with BuildSketch(Plane.ZY.offset(61.7)):
        Polygon((-12.788900808, 11.03), (-17.788769684, 5.527904968), (-26.876469574, 5.527904968), (-26.87626358, 13.272938232), (-20.46, 18.272442322), (-20.46, 11.03), align=None)
        with Locations((-22.27092052, 9.297904968)):
            Circle(ESBO_O26_R, mode=Mode.SUBTRACT)
    extrude(amount=-RESSALTO_EXTRUS_O17_DEPTH)

    # Esboço28 → Corte-extrusão7 (cut)
    with BuildSketch(Plane(origin=(0, 0, -65.1), x_dir=(-1, 0, 0), z_dir=(0, 0, -1))):
        with Locations((-5.615, -59.9)):
            Rectangle(ESBO_O28_W, ESBO_O28_H)
    extrude(amount=-CORTE_EXTRUS_O7_DEPTH, mode=Mode.SUBTRACT)

    # Esboço29 → Corte-extrusão8 (cut)
    with BuildSketch(Plane.XY.offset(20)):
        with Locations((-5.2, -59.900409454)):
            Rectangle(ESBO_O29_W, ESBO_O29_H)
    extrude(amount=-CORTE_EXTRUS_O8_DEPTH, mode=Mode.SUBTRACT)

    # Esboço30 → Corte-extrusão9 (cut, through all)
    with BuildSketch(Plane.XY.offset(-6.1)):
        with Locations((-5.2, -22.185409454)):
            Rectangle(ESBO_O30_W, ESBO_O30_H)
    extrude(amount=CORTE_EXTRUS_O9_DEPTH, mode=Mode.SUBTRACT)

    # Ressalto-extrusão18: up to this face of the body (flat: up to its plane)
    ressalto_extrus_o18_end = Plane(part.part.faces().sort_by_distance((-4.475668498, 10.650350395, -6.1))[0])
    # Esboço31 → Ressalto-extrusão18 (add, up to the picked face)
    with BuildSketch(Plane.XY.offset(-14.46), mode=Mode.PRIVATE) as ressalto_extrus_o18_sk1:
        with Locations((-26.462268067, 9.78)):
            Rectangle(ESBO_O31_W, ESBO_O31_H)
    ressalto_extrus_o18_tool1 = split(extrude(ressalto_extrus_o18_sk1.sketch, amount=RESSALTO_EXTRUS_O18_REACH, mode=Mode.PRIVATE), bisect_by=ressalto_extrus_o18_end, keep=Keep.BOTH, mode=Mode.PRIVATE)
    add(ressalto_extrus_o18_tool1.solids().sort_by(Axis((-26.462268, 9.78, -14.46), (0, 0, 1)))[0])

    # Ressalto-extrusão18 direction 2: up to this face of the body (flat: up to its plane)
    ressalto_extrus_o18_direction_2_end = Plane(part.part.faces().sort_by_distance((-28.083039106, 35.073559946, -20.46))[0])
    # Esboço31 → Ressalto-extrusão18 direction 2 (add, up to the picked face)
    with BuildSketch(Plane.XY.offset(-14.46), mode=Mode.PRIVATE) as ressalto_extrus_o18_direction_2_sk1:
        with Locations((-26.462268067, 9.78)):
            Rectangle(ESBO_O31_W, ESBO_O31_H)
    ressalto_extrus_o18_direction_2_tool1 = split(extrude(ressalto_extrus_o18_direction_2_sk1.sketch, amount=-RESSALTO_EXTRUS_O18_DIRECTION_2_REACH, mode=Mode.PRIVATE), bisect_by=ressalto_extrus_o18_direction_2_end, keep=Keep.BOTH, mode=Mode.PRIVATE)
    add(ressalto_extrus_o18_direction_2_tool1.solids().sort_by(Axis((-26.462268, 9.78, -14.46), (0, 0, -1)))[0])

    # Esboço32 → Corte-extrusão10 (cut)
    with BuildSketch(Plane.XY.offset(-6.1)):
        with Locations((-25.11, 10.100818907)):
            Circle(ESBO_O32_R)
    extrude(amount=-CORTE_EXTRUS_O10_DEPTH, mode=Mode.SUBTRACT)

    # Esboço33 → Corte-extrusão11 (cut)
    with BuildSketch(Plane.XY.offset(-6.1).offset(CORTE_EXTRUS_O11_START)):
        Polygon((-28.26, 8.282165559), (-28.26, 11.919472254), (-25.11, 13.738125602), (-21.96, 11.919472254), (-21.96, 8.282165559), (-21.96, 5.53), (-28.26, 5.53), align=None)
    extrude(amount=-CORTE_EXTRUS_O11_DEPTH, mode=Mode.SUBTRACT)


solid = part.part
